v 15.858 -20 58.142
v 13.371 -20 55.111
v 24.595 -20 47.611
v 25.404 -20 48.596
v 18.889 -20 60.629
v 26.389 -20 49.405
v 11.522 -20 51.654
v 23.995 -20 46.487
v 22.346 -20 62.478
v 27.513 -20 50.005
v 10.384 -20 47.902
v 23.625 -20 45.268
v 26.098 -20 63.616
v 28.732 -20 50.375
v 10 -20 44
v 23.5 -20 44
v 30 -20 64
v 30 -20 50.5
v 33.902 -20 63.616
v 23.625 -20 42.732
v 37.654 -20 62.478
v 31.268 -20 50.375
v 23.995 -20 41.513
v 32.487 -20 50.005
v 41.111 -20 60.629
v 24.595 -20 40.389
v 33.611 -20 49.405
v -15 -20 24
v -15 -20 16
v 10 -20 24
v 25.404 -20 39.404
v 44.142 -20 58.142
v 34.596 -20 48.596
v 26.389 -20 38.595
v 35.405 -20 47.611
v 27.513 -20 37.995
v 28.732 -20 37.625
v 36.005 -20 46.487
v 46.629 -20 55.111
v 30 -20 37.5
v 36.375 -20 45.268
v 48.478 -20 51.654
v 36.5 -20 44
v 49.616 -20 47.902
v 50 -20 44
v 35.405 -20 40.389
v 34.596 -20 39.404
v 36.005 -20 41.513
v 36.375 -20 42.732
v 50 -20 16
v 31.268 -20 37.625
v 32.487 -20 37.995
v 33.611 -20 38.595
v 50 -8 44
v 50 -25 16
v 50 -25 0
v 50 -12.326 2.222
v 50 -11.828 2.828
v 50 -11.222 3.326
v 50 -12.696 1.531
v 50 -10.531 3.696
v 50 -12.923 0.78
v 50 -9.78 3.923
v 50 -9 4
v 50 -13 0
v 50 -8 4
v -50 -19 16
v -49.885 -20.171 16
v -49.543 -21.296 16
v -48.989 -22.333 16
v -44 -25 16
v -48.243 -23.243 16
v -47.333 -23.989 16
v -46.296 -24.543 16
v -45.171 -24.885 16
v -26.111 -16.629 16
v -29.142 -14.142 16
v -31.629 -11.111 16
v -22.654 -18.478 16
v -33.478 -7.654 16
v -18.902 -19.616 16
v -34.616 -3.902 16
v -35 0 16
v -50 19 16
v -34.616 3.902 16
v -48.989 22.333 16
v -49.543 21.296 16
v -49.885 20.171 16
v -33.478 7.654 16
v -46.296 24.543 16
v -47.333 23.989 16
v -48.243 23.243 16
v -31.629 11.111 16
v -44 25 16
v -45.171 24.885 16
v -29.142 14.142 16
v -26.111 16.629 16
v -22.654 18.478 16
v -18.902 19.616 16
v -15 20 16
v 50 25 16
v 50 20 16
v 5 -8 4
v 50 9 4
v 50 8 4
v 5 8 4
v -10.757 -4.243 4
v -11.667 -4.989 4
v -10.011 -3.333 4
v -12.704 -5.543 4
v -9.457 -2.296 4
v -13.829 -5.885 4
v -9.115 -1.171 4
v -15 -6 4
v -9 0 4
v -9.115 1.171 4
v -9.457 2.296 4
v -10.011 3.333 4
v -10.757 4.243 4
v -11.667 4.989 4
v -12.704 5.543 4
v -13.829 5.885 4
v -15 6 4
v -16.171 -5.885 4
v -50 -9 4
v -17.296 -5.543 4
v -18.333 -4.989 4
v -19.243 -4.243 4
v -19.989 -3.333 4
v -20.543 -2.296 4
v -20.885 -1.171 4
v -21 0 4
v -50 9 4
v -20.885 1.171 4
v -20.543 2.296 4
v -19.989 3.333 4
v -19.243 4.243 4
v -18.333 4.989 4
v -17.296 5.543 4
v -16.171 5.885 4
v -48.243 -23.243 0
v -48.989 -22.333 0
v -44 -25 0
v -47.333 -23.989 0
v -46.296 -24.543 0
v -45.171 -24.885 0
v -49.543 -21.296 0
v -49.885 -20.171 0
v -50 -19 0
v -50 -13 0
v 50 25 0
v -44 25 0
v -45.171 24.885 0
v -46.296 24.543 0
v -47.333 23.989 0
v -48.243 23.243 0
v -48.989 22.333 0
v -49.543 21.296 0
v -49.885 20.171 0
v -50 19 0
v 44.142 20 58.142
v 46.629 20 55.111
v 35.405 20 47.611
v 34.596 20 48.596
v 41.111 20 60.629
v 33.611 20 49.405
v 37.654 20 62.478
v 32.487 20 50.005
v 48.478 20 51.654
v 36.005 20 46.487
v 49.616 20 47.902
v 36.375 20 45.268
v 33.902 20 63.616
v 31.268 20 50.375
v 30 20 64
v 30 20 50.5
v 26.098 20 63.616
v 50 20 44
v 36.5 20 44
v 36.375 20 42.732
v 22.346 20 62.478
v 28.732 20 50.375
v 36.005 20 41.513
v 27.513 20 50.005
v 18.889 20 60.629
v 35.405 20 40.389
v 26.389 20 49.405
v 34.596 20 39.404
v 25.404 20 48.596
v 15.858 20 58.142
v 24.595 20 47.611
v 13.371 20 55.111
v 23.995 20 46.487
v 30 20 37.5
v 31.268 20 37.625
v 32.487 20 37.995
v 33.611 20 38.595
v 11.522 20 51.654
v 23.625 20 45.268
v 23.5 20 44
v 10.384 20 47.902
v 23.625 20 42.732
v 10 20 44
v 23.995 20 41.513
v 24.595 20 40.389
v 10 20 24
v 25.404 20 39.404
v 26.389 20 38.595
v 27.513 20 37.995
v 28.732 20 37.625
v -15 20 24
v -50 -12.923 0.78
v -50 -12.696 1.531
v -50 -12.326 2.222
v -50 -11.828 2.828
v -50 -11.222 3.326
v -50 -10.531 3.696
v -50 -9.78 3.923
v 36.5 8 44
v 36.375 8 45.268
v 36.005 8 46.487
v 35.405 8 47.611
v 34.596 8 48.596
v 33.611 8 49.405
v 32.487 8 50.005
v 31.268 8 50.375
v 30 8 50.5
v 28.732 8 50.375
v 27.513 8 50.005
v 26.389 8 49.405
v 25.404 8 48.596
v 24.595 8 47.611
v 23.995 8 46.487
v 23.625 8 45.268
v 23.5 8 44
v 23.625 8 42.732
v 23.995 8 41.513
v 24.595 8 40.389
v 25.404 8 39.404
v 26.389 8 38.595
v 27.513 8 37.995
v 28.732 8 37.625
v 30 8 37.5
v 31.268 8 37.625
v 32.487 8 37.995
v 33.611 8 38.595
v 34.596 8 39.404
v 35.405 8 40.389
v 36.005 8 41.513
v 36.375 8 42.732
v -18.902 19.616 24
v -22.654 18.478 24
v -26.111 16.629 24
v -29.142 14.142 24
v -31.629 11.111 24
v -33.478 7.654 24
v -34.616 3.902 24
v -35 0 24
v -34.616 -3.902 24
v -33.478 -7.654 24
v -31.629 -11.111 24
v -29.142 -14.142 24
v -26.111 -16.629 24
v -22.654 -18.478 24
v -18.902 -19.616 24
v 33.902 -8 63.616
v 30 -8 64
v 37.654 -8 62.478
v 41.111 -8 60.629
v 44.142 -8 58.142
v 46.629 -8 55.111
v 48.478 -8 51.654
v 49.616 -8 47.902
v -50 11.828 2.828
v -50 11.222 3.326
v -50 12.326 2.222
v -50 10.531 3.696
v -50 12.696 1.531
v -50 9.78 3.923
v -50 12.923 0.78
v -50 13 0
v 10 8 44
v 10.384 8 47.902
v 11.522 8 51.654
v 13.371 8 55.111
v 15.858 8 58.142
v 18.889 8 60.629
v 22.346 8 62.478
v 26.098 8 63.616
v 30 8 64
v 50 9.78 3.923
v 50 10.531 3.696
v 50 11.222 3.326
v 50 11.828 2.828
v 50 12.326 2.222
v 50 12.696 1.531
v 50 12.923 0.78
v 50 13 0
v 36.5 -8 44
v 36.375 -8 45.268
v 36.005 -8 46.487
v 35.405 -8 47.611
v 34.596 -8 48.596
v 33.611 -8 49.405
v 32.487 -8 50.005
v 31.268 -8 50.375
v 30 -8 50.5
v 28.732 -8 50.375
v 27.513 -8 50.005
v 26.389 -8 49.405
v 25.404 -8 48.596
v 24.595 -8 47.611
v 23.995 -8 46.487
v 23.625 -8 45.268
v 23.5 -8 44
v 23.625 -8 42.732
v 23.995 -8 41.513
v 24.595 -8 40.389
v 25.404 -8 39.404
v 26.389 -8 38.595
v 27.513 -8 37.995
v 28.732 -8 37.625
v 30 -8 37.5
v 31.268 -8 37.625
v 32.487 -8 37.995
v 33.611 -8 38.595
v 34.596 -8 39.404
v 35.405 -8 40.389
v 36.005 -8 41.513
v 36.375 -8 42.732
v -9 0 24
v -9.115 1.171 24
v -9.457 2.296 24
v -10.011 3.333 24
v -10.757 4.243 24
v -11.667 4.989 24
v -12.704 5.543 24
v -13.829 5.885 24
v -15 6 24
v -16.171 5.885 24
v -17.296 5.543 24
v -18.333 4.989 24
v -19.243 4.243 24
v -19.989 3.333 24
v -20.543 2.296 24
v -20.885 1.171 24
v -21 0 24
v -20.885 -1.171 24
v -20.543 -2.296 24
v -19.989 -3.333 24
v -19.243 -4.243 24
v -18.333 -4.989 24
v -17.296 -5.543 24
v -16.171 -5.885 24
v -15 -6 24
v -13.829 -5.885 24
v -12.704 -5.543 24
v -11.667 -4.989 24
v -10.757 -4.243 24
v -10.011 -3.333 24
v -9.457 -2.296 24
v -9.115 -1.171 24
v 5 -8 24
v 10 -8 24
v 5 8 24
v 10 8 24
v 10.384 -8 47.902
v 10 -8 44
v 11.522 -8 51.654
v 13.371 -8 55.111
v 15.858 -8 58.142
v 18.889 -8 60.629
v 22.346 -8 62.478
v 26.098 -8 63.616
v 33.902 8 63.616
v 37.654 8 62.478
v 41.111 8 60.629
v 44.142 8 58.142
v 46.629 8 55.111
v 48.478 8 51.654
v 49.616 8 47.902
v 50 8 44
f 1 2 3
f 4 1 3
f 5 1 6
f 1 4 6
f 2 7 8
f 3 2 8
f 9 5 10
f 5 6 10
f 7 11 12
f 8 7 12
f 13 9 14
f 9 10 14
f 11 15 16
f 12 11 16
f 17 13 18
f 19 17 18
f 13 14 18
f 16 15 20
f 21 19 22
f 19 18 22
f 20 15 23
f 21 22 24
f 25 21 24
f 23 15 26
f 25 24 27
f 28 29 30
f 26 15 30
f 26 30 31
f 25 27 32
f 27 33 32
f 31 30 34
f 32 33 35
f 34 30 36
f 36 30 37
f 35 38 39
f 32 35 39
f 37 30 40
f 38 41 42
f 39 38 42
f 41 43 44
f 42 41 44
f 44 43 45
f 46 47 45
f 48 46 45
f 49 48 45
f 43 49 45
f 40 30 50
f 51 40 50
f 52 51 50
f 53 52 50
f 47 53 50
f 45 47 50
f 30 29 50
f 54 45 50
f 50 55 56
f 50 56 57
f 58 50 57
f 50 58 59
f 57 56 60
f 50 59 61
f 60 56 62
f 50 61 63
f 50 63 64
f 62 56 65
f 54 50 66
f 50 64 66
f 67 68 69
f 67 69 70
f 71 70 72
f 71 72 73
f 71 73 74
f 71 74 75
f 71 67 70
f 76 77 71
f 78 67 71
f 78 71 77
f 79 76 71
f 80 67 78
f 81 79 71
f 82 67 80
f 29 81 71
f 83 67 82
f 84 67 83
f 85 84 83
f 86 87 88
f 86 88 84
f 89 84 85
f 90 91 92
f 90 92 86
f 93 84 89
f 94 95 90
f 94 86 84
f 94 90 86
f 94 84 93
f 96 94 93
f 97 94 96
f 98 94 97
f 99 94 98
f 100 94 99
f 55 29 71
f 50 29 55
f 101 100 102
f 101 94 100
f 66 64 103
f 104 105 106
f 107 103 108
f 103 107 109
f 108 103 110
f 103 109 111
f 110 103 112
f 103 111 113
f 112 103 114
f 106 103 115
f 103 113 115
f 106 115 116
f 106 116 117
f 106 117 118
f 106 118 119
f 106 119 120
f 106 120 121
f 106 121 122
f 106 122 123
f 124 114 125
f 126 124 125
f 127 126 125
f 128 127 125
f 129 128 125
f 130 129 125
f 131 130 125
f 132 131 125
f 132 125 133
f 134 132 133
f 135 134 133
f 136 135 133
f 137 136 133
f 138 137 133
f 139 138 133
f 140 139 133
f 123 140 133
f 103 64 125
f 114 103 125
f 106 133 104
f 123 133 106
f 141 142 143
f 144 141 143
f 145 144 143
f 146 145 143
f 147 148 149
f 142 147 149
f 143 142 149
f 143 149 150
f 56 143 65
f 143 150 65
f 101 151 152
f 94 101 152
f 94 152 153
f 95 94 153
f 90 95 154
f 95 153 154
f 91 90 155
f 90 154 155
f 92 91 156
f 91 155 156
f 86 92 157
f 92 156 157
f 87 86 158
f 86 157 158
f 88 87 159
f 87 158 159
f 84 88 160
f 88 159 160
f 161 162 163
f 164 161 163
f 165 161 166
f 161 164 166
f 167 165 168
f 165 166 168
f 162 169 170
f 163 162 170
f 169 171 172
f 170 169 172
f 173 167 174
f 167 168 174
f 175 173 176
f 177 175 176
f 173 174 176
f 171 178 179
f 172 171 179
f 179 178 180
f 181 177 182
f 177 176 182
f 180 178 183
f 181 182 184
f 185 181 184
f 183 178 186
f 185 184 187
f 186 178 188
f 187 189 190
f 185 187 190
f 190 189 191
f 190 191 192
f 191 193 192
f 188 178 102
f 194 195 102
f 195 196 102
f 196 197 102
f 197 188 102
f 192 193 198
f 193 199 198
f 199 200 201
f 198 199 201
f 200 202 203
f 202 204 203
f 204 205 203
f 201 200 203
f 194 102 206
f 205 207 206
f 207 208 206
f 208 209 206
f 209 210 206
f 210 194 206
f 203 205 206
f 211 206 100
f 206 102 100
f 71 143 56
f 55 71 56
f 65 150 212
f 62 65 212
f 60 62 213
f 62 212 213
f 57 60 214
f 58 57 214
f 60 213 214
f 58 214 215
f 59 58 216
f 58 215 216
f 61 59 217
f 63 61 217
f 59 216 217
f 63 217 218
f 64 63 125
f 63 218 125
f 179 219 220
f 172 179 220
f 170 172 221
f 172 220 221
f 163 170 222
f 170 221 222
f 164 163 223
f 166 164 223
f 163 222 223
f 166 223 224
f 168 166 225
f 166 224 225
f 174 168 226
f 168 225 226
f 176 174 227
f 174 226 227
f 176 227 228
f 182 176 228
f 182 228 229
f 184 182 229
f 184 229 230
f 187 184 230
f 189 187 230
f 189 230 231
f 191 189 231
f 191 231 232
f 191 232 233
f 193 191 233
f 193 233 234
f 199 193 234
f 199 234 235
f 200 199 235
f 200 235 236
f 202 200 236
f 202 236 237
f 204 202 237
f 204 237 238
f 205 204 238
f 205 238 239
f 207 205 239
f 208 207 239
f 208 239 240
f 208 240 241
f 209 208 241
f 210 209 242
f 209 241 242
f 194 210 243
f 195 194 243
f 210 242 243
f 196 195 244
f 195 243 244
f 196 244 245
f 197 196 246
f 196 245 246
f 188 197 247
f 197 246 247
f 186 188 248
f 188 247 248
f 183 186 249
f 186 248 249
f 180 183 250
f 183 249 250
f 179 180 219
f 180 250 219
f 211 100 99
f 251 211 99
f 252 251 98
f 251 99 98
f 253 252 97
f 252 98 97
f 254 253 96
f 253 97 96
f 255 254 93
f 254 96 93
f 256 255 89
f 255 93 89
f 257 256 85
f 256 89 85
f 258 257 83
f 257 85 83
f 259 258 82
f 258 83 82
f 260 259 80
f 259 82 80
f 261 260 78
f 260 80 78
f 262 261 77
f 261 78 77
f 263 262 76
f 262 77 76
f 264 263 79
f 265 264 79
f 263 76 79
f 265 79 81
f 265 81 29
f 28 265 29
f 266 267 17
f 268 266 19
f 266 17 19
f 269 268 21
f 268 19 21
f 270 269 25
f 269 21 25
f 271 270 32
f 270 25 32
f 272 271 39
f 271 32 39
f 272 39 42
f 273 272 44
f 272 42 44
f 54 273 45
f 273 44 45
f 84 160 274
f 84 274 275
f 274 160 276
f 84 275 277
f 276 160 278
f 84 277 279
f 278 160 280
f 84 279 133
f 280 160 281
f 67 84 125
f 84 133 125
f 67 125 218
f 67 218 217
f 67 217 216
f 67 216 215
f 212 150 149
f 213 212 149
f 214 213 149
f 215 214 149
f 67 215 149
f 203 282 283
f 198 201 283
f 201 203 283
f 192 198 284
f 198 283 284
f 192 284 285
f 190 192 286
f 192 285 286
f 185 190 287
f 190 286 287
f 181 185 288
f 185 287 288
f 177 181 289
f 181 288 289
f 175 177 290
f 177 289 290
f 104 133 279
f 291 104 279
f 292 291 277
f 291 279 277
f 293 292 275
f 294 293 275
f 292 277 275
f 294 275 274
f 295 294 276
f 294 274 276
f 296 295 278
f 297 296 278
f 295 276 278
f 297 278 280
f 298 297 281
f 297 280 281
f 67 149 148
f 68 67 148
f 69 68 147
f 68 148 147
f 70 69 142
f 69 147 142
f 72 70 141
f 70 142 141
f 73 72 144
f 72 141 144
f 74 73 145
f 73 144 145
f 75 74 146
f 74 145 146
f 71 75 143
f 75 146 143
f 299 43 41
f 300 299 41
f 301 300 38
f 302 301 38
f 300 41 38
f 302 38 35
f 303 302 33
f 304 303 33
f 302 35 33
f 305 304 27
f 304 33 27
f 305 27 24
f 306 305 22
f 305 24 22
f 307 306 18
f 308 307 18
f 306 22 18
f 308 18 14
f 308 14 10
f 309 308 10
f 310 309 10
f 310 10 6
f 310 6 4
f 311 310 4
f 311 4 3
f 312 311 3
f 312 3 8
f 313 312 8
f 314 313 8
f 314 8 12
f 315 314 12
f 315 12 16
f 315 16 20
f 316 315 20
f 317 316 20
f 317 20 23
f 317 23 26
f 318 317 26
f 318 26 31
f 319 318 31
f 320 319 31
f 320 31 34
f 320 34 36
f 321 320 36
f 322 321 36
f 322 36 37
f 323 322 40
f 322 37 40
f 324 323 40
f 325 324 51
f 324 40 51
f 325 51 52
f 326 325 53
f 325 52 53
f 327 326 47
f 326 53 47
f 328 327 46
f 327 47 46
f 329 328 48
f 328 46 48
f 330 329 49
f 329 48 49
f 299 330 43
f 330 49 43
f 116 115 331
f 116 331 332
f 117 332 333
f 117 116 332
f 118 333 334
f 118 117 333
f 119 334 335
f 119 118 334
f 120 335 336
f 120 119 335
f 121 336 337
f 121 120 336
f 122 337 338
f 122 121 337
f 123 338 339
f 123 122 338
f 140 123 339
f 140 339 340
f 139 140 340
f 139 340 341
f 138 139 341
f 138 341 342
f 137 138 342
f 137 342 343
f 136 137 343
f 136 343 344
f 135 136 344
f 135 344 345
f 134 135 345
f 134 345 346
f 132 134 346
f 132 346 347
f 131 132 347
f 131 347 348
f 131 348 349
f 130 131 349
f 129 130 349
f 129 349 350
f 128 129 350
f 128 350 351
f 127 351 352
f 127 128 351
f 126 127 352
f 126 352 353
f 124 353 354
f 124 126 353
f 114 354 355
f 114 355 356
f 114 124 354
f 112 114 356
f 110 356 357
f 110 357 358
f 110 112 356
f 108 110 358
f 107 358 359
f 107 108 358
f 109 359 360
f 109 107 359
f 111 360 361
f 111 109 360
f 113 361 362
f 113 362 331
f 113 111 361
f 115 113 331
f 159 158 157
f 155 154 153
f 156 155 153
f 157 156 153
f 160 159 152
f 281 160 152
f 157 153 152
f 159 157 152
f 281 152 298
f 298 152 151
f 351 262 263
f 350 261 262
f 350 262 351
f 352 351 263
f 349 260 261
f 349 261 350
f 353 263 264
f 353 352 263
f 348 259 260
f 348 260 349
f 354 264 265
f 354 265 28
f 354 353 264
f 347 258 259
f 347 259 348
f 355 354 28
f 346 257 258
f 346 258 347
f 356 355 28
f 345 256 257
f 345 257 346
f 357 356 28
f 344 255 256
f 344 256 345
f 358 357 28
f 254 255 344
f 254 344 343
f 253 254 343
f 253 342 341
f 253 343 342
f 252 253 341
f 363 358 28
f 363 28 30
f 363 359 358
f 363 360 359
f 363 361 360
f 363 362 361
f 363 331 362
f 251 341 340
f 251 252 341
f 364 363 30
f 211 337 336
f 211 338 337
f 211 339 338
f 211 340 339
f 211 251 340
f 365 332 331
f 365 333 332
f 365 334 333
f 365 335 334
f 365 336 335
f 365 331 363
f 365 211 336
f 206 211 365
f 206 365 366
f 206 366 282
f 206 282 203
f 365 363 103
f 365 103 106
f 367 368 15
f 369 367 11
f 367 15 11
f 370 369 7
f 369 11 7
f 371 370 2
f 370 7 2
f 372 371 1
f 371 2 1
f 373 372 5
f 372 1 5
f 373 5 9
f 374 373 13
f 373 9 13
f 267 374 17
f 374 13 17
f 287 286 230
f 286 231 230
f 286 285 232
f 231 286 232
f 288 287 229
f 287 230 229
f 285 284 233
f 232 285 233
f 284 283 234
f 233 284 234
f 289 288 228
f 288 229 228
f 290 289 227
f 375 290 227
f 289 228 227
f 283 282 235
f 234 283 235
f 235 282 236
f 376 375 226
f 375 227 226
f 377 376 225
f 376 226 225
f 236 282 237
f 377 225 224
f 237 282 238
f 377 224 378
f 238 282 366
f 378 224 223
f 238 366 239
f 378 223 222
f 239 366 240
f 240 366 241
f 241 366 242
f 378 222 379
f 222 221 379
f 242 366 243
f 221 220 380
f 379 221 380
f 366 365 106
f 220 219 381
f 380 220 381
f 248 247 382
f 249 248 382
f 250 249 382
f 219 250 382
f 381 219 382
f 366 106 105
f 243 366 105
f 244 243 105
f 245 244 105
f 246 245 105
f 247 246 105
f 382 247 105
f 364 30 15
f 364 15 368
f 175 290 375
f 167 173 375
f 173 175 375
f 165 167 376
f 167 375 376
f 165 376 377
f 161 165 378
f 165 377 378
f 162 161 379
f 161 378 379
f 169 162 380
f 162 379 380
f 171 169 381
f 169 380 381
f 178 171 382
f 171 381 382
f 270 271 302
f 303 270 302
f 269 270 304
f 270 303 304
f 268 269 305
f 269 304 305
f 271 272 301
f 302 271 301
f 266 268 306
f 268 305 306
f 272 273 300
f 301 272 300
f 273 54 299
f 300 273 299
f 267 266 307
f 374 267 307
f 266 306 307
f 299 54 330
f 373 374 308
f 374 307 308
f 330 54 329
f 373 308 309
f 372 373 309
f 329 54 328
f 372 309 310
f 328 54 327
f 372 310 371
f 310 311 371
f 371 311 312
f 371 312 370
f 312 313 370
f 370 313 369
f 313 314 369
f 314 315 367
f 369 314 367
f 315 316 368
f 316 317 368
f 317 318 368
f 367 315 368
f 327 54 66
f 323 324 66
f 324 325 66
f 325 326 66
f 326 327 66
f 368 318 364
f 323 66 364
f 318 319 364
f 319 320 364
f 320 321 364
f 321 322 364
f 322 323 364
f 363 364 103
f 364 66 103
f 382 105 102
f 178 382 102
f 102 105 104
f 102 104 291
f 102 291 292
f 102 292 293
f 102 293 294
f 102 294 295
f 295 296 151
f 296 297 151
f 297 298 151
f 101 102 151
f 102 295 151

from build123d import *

# Parameters (mm, degrees)
F0_W     = 40
F0_H     = 12
F0_R     = 6
F1_DEPTH = 16
F2_DEPTH = 24
F3_DEPTH = 64
F5_DEPTH = 100.001
F6_R     = 6.5
F7_DEPTH = 45.001


with BuildPart() as f1:
    # F0 (on Top) → F1 (new body)
    with BuildSketch(Plane.XY):
        with BuildLine():
            Line((50, 20), (50, 25))
            Line((50, 25), (-44, 25))
            ThreePointArc((-44, 25), (-48.2426406871, 23.2426406871), (-50, 19))
            Line((-50, 19), (-50, -19))
            ThreePointArc((-50, -19), (-48.2426406871, -23.2426406871), (-44, -25))
            Line((-44, -25), (50, -25))
            Line((50, -25), (50, -20))
            Line((50, -20), (10, -20))
            Line((10, -20), (-15, -20))
            ThreePointArc((-15, -20), (-35, 0), (-15, 20))
            Line((-15, 20), (10, 20))
            Line((10, 20), (50, 20))
        make_face()
        with Locations((30, 14)):
            Rectangle(F0_W, F0_H)
        with BuildLine():
            Line((10, 8), (10, 20))
            Line((10, 20), (-15, 20))
            ThreePointArc((-15, 20), (-35, 0), (-15, -20))
            Line((-15, -20), (10, -20))
            Line((10, -20), (10, -8))
            Line((10, -8), (5, -8))
            Line((5, -8), (5, 8))
            Line((5, 8), (10, 8))
        make_face()
        with Locations((-15, 0)):
            Circle(F0_R, mode=Mode.SUBTRACT)
        with Locations((30, -14)):
            Rectangle(F0_W, F0_H)
    extrude(amount=F1_DEPTH)

    # F0 (on Top) → F2 (join)
    with BuildSketch(Plane.XY):
        with BuildLine():
            Line((10, 8), (10, 20))
            Line((10, 20), (-15, 20))
            ThreePointArc((-15, 20), (-35, 0), (-15, -20))
            Line((-15, -20), (10, -20))
            Line((10, -20), (10, -8))
            Line((10, -8), (5, -8))
            Line((5, -8), (5, 8))
            Line((5, 8), (10, 8))
        make_face()
        with Locations((-15, 0)):
            Circle(F0_R, mode=Mode.SUBTRACT)
        with Locations((30, -14)):
            Rectangle(F0_W, F0_H)
        with Locations((30, 14)):
            Rectangle(F0_W, F0_H)
    extrude(amount=F2_DEPTH)

    # F0 (on Top) → F3 (join)
    with BuildSketch(Plane.XY):
        with Locations((30, -14)):
            Rectangle(F0_W, F0_H)
        with Locations((30, 14)):
            Rectangle(F0_W, F0_H)
    extrude(amount=F3_DEPTH)

    # F4 (on face) → F5 (cut, through all)
    with BuildSketch(Plane(origin=(-50, 0, 0), x_dir=(0, -1, 0), z_dir=(-1, 0, 0))):
        with BuildLine():
            Line((-13, 0), (13, 0))
            ThreePointArc((13, 0), (11.8284271247, 2.8284271247), (9, 4))
            Line((9, 4), (-9, 4))
            ThreePointArc((-9, 4), (-11.8284271247, 2.8284271247), (-13, 0))
        make_face()
    extrude(amount=-F5_DEPTH, mode=Mode.SUBTRACT)

    # F6 (on face) → F7 (cut, through all)
    with BuildSketch(Plane.XZ.offset(20)):
        with Locations((30, 44)):
            Circle(F6_R)
        with BuildLine():
            Line((10, 64), (10, 44))
            ThreePointArc((10, 44), (15.8578643763, 58.1421356237), (30, 64))
            Line((30, 64), (10, 64))
        make_face()
        with BuildLine():
            Line((50, 64), (30, 64))
            ThreePointArc((30, 64), (44.1421356237, 58.1421356237), (50, 44))
            Line((50, 44), (50, 64))
        make_face()
    extrude(amount=-F7_DEPTH, mode=Mode.SUBTRACT)


solid = f1.part
